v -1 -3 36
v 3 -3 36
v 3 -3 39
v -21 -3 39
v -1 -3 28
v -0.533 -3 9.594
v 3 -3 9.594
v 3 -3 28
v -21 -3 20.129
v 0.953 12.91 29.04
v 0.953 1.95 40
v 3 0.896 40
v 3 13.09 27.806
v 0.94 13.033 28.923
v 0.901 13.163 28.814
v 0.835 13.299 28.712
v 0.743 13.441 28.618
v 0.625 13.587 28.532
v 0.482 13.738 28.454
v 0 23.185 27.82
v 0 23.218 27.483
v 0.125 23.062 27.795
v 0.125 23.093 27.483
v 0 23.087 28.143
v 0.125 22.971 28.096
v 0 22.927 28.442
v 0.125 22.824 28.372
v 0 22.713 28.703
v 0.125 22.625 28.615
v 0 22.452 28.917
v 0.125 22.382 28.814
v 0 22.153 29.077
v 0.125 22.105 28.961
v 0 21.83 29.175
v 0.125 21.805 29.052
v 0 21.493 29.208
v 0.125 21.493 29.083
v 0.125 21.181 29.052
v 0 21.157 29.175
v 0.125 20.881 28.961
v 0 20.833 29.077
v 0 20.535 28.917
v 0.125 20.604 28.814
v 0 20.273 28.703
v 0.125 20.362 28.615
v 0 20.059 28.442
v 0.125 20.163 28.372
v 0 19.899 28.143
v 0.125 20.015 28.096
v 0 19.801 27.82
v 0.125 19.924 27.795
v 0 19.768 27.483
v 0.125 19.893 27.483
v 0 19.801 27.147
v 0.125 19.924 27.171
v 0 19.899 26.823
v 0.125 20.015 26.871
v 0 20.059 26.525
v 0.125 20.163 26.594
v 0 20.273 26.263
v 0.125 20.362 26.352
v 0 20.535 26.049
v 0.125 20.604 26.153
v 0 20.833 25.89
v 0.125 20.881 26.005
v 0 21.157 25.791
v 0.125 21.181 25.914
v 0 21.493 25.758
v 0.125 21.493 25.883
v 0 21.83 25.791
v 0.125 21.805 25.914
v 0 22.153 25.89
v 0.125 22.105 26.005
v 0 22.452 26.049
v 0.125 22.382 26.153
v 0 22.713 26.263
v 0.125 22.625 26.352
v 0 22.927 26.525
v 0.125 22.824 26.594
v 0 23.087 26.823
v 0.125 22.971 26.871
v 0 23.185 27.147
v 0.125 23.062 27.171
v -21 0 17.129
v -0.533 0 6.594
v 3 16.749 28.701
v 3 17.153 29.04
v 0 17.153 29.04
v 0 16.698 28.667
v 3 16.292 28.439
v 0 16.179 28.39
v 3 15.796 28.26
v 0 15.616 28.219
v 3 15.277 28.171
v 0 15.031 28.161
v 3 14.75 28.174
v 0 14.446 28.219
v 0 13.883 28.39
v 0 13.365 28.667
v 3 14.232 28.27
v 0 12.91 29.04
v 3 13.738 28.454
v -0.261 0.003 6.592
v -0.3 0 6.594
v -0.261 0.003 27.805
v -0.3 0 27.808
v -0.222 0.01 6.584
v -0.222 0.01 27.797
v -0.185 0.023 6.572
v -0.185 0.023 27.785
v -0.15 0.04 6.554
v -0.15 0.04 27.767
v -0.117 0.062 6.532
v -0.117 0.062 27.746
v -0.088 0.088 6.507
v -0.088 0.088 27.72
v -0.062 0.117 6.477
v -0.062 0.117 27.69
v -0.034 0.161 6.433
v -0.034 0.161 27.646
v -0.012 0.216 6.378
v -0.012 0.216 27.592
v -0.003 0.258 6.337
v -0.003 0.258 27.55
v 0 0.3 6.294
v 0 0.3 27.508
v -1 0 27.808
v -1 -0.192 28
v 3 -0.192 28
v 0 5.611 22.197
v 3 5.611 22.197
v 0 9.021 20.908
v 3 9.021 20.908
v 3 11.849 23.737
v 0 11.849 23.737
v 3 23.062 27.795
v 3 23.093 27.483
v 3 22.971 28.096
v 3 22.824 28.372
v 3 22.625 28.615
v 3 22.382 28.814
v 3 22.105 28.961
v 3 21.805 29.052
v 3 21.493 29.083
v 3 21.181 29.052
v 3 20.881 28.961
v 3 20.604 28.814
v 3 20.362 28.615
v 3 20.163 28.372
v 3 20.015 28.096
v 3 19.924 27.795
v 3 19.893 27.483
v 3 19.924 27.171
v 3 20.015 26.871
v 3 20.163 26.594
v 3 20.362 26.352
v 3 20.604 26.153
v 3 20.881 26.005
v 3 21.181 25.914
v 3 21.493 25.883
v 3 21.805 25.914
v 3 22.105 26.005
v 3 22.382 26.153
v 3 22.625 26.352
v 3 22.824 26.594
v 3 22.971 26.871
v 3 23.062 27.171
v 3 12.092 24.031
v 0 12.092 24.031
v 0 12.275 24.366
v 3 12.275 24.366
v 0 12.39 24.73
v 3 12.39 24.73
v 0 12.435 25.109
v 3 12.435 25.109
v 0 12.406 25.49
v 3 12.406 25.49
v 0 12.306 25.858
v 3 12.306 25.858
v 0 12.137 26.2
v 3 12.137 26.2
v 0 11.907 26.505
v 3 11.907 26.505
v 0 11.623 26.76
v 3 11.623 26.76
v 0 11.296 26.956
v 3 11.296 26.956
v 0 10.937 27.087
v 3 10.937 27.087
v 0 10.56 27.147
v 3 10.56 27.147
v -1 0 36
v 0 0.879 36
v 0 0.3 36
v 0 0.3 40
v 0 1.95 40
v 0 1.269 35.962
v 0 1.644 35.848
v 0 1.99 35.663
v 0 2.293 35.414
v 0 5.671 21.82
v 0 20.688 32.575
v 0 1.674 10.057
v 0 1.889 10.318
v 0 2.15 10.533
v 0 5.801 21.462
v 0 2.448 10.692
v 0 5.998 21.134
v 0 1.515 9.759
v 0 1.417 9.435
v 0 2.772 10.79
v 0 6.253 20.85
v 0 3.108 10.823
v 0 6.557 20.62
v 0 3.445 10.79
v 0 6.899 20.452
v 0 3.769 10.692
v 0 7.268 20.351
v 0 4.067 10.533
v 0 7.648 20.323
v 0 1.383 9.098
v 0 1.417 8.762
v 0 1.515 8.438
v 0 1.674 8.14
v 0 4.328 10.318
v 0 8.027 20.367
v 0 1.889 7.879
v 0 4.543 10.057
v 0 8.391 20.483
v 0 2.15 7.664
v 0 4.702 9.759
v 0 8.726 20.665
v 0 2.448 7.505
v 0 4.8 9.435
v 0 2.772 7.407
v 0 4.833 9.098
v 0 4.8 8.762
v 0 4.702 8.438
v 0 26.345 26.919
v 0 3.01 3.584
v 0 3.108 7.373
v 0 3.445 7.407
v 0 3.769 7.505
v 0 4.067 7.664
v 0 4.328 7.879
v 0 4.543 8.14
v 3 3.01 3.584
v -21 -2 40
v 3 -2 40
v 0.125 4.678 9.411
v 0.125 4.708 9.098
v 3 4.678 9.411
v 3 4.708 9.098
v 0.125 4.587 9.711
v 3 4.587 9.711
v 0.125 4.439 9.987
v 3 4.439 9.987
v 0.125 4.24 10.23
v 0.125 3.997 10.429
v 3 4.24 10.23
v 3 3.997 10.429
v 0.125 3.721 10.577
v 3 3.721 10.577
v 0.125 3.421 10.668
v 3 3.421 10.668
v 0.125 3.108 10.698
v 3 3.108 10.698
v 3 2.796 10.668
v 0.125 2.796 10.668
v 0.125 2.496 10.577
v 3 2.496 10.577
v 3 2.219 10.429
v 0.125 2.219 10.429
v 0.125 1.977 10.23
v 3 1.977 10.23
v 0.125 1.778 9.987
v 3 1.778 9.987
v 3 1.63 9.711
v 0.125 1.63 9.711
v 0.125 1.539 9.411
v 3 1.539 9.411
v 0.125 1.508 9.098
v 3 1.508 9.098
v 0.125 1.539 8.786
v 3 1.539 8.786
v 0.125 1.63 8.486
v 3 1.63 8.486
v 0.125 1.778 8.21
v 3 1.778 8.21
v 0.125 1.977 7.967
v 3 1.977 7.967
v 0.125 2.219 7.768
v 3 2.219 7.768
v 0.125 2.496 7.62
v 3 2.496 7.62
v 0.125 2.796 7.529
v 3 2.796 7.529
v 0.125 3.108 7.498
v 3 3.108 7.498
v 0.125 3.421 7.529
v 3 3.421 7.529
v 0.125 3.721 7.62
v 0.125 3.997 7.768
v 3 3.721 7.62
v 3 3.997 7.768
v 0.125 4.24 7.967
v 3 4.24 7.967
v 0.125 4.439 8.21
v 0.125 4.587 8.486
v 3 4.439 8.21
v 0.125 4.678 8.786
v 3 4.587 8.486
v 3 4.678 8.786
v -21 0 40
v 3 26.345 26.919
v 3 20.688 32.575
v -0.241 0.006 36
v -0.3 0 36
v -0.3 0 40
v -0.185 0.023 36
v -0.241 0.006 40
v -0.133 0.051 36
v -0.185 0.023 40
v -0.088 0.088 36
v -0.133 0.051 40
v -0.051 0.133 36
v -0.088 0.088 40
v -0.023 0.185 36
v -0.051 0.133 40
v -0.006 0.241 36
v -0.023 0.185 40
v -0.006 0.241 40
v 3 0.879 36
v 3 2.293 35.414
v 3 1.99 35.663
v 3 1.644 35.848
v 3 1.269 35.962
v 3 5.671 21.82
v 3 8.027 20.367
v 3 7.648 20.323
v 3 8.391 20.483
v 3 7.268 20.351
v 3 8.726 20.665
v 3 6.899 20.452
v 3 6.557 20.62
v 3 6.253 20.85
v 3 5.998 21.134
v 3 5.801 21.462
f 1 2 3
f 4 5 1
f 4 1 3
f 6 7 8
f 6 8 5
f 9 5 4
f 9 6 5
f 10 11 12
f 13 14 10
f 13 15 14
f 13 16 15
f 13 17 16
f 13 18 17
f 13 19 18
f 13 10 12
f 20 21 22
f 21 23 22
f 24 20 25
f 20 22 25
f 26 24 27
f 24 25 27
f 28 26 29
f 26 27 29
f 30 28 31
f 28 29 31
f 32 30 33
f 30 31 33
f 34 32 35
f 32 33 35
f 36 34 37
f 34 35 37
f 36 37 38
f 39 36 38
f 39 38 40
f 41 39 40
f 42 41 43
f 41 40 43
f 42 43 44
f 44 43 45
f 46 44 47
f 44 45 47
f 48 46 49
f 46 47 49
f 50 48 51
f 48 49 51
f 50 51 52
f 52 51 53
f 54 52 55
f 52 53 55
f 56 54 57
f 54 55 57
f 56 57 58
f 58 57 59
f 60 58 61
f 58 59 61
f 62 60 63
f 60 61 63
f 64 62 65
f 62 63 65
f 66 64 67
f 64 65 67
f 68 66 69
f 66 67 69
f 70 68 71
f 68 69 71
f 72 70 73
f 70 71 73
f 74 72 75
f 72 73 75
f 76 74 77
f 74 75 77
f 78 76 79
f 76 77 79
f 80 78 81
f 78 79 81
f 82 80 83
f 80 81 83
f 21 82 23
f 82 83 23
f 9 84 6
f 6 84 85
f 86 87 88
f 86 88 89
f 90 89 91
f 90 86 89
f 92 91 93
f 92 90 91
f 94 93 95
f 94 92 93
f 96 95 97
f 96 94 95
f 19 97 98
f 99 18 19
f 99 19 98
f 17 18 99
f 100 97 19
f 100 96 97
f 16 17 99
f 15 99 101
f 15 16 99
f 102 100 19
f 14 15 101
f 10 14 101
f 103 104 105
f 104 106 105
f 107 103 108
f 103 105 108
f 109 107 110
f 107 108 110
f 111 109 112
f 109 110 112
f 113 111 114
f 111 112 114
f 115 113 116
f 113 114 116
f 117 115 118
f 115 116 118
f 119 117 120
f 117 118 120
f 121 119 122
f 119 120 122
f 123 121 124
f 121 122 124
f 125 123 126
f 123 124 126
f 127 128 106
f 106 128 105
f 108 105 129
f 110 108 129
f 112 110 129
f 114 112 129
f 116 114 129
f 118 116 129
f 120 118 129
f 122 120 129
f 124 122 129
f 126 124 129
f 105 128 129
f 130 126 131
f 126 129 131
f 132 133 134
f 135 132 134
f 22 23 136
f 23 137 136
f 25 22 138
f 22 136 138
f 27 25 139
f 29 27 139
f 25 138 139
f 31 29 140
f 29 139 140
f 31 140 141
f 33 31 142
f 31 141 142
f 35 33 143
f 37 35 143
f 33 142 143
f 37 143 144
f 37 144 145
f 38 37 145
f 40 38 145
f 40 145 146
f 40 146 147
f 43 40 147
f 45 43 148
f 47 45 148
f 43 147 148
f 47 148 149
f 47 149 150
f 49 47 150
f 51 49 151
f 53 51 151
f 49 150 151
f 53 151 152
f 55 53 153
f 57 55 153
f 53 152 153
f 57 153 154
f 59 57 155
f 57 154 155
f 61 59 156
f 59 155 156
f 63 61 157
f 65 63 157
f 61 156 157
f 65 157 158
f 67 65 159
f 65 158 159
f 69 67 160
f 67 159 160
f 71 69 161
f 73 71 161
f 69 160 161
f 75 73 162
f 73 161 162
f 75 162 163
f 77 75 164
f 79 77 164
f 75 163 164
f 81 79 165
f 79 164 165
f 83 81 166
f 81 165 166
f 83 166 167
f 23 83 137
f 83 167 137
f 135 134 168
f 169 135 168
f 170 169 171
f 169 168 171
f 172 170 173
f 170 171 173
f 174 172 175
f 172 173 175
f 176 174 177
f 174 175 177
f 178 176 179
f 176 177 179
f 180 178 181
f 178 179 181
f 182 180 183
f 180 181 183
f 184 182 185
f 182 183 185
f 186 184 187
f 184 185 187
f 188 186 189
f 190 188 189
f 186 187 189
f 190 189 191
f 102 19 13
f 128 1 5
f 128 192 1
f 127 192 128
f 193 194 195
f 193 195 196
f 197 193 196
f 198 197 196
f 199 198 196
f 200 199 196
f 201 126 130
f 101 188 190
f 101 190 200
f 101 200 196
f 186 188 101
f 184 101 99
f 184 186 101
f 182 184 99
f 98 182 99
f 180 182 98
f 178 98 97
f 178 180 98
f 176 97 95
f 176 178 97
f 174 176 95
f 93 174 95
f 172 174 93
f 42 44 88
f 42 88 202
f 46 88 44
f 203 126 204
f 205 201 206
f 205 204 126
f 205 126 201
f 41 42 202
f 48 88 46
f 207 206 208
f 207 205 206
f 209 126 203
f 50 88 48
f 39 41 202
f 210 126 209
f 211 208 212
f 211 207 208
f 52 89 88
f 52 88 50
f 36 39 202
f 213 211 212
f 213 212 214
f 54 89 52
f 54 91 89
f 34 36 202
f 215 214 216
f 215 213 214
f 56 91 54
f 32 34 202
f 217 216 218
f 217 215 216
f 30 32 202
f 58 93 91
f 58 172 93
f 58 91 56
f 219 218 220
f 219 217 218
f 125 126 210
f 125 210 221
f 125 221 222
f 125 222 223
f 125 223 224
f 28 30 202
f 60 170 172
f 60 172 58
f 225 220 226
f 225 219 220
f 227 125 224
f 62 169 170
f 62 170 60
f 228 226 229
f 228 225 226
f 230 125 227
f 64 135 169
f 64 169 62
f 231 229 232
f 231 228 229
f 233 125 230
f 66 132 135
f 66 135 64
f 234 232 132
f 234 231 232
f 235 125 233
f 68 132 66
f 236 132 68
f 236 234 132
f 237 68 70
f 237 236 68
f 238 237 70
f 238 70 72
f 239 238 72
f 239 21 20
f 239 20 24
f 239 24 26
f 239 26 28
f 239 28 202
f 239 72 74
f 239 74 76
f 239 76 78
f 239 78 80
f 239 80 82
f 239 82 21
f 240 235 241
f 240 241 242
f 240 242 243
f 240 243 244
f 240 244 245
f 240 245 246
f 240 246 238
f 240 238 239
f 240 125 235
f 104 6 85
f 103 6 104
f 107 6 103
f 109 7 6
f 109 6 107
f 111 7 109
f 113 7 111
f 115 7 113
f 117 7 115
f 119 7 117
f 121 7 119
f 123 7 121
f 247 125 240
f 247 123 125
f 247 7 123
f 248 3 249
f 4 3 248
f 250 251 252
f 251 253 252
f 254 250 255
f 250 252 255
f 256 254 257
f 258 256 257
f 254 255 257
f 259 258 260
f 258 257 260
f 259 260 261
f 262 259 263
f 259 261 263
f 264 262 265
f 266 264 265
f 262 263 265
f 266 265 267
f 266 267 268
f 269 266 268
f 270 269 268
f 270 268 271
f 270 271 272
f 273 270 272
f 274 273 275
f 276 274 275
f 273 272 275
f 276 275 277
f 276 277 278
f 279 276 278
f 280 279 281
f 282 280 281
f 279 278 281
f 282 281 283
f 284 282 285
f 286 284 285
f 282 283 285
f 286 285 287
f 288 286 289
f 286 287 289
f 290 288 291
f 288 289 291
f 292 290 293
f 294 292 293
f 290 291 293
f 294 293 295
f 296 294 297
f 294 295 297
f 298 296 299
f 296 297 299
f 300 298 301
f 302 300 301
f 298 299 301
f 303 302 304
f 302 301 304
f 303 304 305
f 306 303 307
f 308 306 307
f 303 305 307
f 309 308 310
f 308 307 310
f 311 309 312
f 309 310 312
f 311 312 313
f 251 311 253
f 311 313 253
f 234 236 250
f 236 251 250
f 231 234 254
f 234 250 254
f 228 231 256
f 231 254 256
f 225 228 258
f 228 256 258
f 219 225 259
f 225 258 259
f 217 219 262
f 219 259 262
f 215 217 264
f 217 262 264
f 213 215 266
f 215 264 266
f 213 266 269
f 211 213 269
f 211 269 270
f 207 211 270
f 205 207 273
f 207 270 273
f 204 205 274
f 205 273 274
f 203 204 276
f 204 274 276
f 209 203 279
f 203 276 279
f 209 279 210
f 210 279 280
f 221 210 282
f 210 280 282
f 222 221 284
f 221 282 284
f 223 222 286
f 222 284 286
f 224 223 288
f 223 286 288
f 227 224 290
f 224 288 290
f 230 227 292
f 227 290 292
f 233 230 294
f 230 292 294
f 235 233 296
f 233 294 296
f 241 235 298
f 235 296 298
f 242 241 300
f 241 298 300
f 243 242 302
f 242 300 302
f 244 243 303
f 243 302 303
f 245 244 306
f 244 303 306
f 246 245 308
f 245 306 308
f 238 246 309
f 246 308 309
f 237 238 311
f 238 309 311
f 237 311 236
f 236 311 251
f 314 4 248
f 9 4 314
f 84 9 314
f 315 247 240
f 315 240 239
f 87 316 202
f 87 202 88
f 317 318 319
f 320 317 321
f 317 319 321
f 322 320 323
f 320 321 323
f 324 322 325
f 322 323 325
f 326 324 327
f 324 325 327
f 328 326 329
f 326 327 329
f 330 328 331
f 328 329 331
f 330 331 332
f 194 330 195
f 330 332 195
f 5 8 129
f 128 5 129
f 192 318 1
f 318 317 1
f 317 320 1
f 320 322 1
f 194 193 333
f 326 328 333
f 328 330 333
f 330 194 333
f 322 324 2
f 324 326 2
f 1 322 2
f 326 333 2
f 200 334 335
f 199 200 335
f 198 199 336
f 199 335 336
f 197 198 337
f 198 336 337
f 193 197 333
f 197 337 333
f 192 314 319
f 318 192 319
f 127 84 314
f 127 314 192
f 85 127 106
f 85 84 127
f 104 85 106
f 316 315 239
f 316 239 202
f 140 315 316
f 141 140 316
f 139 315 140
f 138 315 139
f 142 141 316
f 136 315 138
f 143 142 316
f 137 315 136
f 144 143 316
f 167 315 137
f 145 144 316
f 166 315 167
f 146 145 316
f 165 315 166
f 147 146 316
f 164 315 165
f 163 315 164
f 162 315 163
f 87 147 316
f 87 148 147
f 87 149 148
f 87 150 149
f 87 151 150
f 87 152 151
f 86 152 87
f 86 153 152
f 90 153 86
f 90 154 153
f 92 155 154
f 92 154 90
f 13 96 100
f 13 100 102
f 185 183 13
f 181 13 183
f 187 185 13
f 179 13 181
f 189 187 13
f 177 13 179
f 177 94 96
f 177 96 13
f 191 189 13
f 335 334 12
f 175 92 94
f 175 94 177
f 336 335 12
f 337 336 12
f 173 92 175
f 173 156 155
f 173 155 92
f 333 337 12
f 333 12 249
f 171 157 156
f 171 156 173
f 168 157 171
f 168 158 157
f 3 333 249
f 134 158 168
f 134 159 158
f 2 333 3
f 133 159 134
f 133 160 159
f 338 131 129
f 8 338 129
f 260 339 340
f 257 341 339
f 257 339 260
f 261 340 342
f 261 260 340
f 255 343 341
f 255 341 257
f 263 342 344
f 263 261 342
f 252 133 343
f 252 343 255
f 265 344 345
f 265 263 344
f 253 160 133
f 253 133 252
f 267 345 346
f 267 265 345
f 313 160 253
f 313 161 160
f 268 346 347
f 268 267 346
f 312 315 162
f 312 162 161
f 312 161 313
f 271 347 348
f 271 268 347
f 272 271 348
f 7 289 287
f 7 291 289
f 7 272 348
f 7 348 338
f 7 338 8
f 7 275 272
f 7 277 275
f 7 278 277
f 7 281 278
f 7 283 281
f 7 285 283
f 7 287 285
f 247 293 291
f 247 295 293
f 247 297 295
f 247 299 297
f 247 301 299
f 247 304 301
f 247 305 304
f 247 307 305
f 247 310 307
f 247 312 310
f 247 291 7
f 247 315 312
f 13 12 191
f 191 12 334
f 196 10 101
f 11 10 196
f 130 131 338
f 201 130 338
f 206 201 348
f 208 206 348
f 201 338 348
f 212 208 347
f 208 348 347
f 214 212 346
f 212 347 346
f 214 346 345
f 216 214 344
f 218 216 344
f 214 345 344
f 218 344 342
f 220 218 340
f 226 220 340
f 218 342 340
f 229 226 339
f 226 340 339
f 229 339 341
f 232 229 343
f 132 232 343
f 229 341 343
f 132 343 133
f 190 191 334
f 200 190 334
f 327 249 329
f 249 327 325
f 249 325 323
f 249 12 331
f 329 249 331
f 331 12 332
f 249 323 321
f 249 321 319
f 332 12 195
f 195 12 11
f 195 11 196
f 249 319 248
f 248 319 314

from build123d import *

# Parameters (mm, degrees)
EXTRUDE_1_DEPTH     = 40
CUT_EXTRUDE_START   = -3
CUT_EXTRUDE_1_DEPTH = 24
CUT_EXTRUDE_2_DEPTH = 53.224395281
CUT_EXTRUDE_3_DEPTH = 4
CUT_EXTRUDE_START_2 = 2
CUT_EXTRUDE_6_DEPTH = 50.413883947
CHAMFER_1_SIZE      = 1
FILLET_1_R          = 0.3


# Read off the part's stored shape, not the designer's step: Вырез-Вытянуть1, Отверстие с зазором M31
with BuildPart() as part:
    # Эскиз1 → Бобышка-Вытянуть1 (new body)
    with BuildSketch(Plane.XY):
        Polygon((0, 0), (0, 35), (3, 35), (3, -3), (-21, -3), (-21, 0), align=None)
    extrude(amount=EXTRUDE_1_DEPTH)

    # Вырез-Вытянуть1 outline → Вырез-Вытянуть1 (cut)
    with BuildSketch(Plane.ZY.offset(CUT_EXTRUDE_START)):
        with BuildLine():
            ThreePointArc((29.039844892, 17.152543264), (28.161165235, 15.03122292), (29.039844892, 12.909902577))
            Line((29.039844892, 12.909902577), (40, 1.949747468))
            Line((40, 1.949747468), (40, 35))
            Line((40, 35), (0, 35))
            Line((0, 35), (0, -3))
            Line((0, -3), (9.594408409, -3))
            Line((9.594408409, -3), (3.584000769, 3.01040764))
            Line((3.584000769, 3.01040764), (26.918524548, 26.344931419))
            Line((26.918524548, 26.344931419), (32.575378798, 20.68807717))
            Line((32.575378798, 20.68807717), (29.039844892, 17.152543264))
        make_face()
    extrude(amount=CUT_EXTRUDE_1_DEPTH, mode=Mode.SUBTRACT)

    # Эскиз3 → Вырез-Вытянуть2 (cut, through all)
    with BuildSketch(Plane(origin=(0, -0.286796564, 0.286796564), x_dir=(1, 0, 0), z_dir=(0, 0.7071067811865488, -0.7071067811865462))):
        Polygon((-118.62691727, -47.645487261), (-21, -12.112195311), (-0.533369199, -4.662950904), (97.093548071, 30.870341046), (26.026964172, 226.124175586), (-189.693501169, 147.608347279), align=None)
    extrude(amount=-CUT_EXTRUDE_2_DEPTH, mode=Mode.SUBTRACT)

    # Эскиз4 → Вырез-Вытянуть3 (cut)
    with BuildSketch(Plane(origin=(3, 0, 0), x_dir=(0, 0, -1), z_dir=(1, 0, 0))):
        with BuildLine():
            Line((-28, -3), (-28, -0.192388155))
            Line((-28, -0.192388155), (-22.197084645, 5.610527199))
            ThreePointArc((-22.197084645, 5.610527199), (-20.451501777, 6.899494937), (-20.908116908, 9.02081528))
            Line((-20.908116908, 9.02081528), (-23.736544033, 11.849242405))
            ThreePointArc((-23.736544033, 11.849242405), (-25.857864376, 12.305857536), (-27.146832114, 10.560274668))
            Line((-27.146832114, 10.560274668), (-35.414213562, 2.292893219))
            ThreePointArc((-35.414213562, 2.292893219), (-35.847759065, 1.644046521), (-36, 0.878679656))
            Line((-36, 0.878679656), (-36, -3))
            Line((-36, -3), (-28, -3))
        make_face()
    extrude(amount=-CUT_EXTRUDE_3_DEPTH, mode=Mode.SUBTRACT)

    # Эскиз5 → Вырез-Вытянуть6 (cut, through all)
    with BuildSketch(Plane(origin=(0, -5.943650814, 5.943650814), x_dir=(1, 0, 0), z_dir=(0, -0.7071067811865488, 0.7071067811865464)).offset(CUT_EXTRUDE_START_2)):
        Polygon((0, 30.009937166), (3, 28.918026463), (3, 37.662950904), (0, 37.662950904), align=None)
    extrude(amount=CUT_EXTRUDE_6_DEPTH, mode=Mode.SUBTRACT)

    # Фаска1
    chamfer_1_edges = [part.edges().sort_by_distance(p)[0] for p in [
        (-9, -3, 40),
    ]]
    chamfer(chamfer_1_edges, length=CHAMFER_1_SIZE)

    # Отверстие с зазором M31 outline → Отверстие с зазором M31 (revolve, cut)
    with BuildSketch(Plane(origin=(0, 3.108402615, 9.098433688), x_dir=(0, 1, 0), z_dir=(0, 0, -1))):
        Polygon((0, 0), (1.725, 0), (1.6, 0.125), (1.6, 3), (0, 3), align=None)
    revolve(axis=Axis((0, 3.108402615, 9.098433688), (1, 0, 0)), mode=Mode.SUBTRACT)

    # Hole Wizard M31 2 outline → Hole Wizard M31 2 (revolve, cut)
    with BuildSketch(Plane(origin=(0, 21.493178926, 27.483209999), x_dir=(0, 1, 0), z_dir=(0, 0, -1))):
        Polygon((0, 0), (1.725, 0), (1.6, 0.125), (1.6, 3), (0, 3), align=None)
    revolve(axis=Axis((0, 21.493178926, 27.483209999), (1, 0, 0)), mode=Mode.SUBTRACT)

    # Скругление1
    fillet_1_edges = [part.edges().sort_by_distance(p)[0] for p in [
        (0, 0, 38),
        (0, 0, 17.201010127),
    ]]
    fillet(fillet_1_edges, radius=FILLET_1_R)


solid = part.part
